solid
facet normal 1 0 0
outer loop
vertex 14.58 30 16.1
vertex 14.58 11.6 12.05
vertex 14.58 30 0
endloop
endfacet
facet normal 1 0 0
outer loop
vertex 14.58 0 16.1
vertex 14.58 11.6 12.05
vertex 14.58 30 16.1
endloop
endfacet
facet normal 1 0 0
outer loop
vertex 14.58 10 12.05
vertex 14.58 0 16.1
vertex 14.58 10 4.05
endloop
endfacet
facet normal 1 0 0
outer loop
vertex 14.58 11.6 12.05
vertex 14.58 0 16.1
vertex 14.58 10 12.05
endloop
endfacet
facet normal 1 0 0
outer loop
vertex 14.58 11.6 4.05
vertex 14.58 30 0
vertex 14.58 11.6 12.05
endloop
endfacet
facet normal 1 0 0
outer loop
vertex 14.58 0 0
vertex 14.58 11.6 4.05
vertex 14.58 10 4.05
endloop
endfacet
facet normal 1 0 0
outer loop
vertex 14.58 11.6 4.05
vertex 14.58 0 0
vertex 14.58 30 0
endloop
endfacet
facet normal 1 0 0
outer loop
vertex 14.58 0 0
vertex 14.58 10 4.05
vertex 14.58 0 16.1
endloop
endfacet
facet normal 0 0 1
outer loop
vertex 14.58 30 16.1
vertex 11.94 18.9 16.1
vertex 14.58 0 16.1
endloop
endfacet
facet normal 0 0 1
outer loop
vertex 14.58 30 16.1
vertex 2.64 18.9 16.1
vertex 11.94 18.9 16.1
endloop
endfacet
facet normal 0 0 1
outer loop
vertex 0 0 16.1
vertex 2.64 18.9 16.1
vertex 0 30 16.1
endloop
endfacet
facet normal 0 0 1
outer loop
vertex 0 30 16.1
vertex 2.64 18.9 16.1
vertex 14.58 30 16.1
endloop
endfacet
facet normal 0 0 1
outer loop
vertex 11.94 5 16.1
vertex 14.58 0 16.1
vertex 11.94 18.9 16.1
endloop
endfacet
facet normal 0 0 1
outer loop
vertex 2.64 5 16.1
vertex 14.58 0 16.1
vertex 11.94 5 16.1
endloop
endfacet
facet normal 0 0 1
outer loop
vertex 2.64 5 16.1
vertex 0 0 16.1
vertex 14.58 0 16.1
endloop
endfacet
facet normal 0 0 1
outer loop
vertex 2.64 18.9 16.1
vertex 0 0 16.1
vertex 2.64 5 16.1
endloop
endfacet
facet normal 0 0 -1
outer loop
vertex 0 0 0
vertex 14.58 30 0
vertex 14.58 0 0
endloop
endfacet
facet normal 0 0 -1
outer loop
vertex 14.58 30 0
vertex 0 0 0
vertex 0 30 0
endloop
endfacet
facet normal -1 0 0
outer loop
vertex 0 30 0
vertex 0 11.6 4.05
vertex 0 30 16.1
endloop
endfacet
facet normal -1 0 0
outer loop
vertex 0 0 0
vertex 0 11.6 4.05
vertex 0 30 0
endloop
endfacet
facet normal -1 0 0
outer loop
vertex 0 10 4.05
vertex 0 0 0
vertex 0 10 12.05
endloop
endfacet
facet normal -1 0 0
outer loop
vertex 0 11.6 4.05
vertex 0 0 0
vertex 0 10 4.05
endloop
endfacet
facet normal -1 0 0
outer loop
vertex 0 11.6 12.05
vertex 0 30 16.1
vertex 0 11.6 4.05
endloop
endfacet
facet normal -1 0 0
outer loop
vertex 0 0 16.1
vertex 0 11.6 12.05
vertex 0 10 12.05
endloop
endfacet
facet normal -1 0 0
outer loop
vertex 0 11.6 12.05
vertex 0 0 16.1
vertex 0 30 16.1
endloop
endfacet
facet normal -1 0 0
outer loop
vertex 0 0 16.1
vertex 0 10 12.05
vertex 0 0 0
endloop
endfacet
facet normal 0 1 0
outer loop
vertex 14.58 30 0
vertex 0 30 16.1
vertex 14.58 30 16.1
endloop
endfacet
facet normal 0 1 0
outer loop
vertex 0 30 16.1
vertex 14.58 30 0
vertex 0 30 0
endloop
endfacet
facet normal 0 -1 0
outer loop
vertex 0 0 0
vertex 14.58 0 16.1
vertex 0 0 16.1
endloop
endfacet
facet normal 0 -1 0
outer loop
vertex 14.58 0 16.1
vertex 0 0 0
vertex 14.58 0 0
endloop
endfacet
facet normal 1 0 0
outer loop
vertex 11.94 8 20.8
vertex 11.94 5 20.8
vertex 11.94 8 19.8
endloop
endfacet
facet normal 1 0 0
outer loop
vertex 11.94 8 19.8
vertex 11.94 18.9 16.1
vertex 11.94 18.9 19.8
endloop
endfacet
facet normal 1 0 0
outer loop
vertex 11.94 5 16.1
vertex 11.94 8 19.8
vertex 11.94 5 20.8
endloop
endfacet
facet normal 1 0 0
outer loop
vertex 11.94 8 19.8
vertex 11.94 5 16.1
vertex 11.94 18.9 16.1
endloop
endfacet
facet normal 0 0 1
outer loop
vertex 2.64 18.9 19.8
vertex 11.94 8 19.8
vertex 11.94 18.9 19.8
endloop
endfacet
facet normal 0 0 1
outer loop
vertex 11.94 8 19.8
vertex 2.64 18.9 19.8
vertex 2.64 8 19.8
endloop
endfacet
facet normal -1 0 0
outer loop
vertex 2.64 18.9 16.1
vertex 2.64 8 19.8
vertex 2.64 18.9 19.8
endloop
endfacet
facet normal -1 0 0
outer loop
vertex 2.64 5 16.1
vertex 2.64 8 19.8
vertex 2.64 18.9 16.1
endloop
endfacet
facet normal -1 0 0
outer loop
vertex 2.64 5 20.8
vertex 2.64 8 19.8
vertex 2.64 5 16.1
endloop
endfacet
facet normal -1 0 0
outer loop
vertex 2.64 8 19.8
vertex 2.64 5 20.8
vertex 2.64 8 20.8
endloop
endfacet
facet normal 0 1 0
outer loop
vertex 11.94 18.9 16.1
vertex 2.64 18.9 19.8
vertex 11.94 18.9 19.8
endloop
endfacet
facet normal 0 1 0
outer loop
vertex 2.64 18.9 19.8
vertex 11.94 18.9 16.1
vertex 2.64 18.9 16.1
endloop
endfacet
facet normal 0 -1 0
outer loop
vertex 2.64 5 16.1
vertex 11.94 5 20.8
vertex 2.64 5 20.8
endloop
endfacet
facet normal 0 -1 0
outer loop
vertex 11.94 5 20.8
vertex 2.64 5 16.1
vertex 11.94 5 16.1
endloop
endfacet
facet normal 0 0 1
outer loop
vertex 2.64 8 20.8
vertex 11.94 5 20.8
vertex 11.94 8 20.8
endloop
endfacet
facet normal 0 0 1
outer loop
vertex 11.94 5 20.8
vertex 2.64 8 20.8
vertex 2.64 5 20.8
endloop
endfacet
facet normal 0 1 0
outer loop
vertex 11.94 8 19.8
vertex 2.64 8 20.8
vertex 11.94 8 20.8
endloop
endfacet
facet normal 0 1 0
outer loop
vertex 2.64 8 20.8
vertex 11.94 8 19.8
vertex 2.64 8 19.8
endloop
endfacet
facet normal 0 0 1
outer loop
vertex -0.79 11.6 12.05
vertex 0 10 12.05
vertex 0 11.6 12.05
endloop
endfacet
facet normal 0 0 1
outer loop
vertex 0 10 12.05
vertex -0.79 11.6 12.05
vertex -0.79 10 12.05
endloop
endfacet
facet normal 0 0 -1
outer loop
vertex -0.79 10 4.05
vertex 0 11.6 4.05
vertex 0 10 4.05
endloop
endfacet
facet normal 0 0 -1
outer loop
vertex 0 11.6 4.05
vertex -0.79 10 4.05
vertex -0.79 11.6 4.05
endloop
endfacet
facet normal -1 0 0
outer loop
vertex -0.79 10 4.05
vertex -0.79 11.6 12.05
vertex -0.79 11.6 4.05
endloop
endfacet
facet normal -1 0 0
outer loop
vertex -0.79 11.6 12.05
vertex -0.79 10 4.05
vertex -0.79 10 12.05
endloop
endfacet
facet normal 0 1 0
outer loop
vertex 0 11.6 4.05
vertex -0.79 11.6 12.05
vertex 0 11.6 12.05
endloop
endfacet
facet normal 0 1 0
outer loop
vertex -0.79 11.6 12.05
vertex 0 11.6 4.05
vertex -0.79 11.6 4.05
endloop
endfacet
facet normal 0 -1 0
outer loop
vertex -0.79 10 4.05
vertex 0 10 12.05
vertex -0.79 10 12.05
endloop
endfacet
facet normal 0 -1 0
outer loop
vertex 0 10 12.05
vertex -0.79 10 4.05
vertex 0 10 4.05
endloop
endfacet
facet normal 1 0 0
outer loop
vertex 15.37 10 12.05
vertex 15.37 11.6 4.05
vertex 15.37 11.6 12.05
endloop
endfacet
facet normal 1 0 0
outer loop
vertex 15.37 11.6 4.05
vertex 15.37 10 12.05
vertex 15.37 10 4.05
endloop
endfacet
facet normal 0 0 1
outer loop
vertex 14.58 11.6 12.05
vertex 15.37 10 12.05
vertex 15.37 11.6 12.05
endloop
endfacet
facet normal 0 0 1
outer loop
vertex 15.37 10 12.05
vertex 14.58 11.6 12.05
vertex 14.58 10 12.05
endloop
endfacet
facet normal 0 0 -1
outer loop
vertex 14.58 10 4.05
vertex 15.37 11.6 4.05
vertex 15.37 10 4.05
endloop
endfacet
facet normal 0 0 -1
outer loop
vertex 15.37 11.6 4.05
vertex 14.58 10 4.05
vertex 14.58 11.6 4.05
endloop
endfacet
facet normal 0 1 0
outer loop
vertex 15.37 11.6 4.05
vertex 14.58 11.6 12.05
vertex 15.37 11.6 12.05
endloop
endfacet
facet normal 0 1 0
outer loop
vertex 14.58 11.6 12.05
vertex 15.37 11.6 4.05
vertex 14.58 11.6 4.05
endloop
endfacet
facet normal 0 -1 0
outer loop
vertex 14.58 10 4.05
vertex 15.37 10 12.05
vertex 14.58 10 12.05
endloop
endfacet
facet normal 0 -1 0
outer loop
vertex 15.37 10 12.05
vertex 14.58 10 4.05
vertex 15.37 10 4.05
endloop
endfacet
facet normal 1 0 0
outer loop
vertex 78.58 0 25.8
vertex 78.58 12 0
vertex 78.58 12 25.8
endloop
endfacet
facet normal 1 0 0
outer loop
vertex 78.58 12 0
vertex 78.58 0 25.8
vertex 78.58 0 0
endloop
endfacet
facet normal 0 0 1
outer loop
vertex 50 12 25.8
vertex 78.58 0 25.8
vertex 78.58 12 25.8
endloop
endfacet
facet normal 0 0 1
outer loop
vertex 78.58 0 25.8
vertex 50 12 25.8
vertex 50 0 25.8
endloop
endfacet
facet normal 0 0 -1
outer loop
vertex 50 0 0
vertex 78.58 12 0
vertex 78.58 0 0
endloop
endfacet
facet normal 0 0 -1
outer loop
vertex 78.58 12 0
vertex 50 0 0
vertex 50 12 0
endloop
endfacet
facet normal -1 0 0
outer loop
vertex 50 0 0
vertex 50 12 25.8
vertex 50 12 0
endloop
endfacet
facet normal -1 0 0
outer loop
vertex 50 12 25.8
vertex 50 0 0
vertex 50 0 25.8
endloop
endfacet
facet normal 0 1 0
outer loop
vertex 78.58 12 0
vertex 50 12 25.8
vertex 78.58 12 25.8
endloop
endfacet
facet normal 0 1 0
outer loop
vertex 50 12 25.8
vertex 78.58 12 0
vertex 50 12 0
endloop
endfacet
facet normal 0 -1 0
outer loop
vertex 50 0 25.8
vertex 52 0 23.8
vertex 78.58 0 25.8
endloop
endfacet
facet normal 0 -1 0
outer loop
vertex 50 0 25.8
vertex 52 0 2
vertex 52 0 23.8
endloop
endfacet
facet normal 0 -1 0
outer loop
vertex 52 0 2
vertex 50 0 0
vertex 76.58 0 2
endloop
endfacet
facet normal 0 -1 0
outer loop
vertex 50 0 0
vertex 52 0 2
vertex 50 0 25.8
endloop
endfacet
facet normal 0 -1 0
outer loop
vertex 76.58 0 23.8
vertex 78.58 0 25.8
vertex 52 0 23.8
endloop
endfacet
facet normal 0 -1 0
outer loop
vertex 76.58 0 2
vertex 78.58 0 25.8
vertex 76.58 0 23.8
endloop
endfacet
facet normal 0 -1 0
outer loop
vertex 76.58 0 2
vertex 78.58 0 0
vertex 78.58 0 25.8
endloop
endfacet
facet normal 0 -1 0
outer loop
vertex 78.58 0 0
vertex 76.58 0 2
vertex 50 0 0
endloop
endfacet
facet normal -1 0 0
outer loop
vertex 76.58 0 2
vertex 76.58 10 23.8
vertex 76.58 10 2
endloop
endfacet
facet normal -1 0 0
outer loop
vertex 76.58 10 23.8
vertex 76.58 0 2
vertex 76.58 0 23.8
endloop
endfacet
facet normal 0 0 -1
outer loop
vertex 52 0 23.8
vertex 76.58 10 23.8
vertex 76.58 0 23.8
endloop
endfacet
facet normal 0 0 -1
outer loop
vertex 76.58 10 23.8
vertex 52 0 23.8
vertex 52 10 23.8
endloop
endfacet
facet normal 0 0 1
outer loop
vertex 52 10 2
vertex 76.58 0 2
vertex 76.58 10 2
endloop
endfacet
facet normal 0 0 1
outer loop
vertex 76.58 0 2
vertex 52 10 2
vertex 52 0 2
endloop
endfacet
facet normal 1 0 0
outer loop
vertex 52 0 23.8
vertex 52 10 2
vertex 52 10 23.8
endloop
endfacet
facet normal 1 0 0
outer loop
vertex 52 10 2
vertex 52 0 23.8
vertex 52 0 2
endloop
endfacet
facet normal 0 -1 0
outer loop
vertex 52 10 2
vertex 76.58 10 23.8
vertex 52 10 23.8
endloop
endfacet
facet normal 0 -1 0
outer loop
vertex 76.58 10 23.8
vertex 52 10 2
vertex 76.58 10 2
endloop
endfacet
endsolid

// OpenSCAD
// file: keystone panel.scad
//keystone for the tray, for routing cables from switch to stuff in the back. Just a cheap amazon keystone.
//
//
//the keystone gets inserted from the rear of the panel, not the front, so the catch clips in, the front stopper should ride
//over the panel front when the catch is squished, then prevent the keystone from being pushed back into the tray.

/*
// next 2 lines used only by my 'on save' script. can be ignored otherwise.
// AUTO-V
version = "v0.1-2026/05/07r18";
*/

ks_width = 14.580;
ks_height = 16.10;
ks_depth = 30.0;
ks_catch_height = 3.7;
ks_catch_width = 9.3;
ks_catch_depth = 13.9;
ks_catch_ypos = 5.0;
ks_catch_edge_depth = 3.0; //the edge part is a tab that sticks up slightly more than the catch
ks_catch_edge_height = 1.0;
ks_side_lip_depth = 1.6;
ks_side_lip_height = 8.0;
ks_side_lip_ypos = 10.0;
ks_side_lip_width = (16.16 - ks_width) / 2;
//there is also a bottom lip, but the catch on top will squish and clip into the case, making the bottom lip a front stopper.
//using this keystone means the front panel is max 2mm thick.

//the panel recess for the keystones, this is because the keystones will otherwise protrude from the front panel.
ks_recess_height = ks_height + ks_catch_height + 2.0; //this is the overall height of the recess in the front panel.
ks_recess_width = ks_width + 10.0; //the overall width of the recess, for multiple this will need adjusting.
ks_recess_depth = ks_side_lip_depth; //how far to recess the keystone into the front panel.
ks_recess_wall_thickness = 2.0; //this is limited by the (ks_catch_ypos+ks_catch_edge_depth)-ks_side_lip_ypos. as the front panel needs to fit between them,

module keystone_panel_recess() {
    difference() {
        cube([ks_recess_width+(ks_recess_wall_thickness * 2), ks_side_lip_ypos+ks_recess_wall_thickness, ks_recess_height+(ks_recess_wall_thickness * 2)]);
        translate([ks_recess_wall_thickness, 0, ks_recess_wall_thickness]) {
            cube([ks_recess_width, ks_side_lip_ypos, ks_recess_height]);
        }
    }
}


module keystone() {
    color("green") {
        cube([ks_width, ks_depth, ks_height]);
    }
    // catch for the keystone to stop it falling out of the tray.
    translate([(ks_width - ks_catch_width)/2, ks_catch_ypos, ks_height]) {
        color("yellow") {
            cube([ks_catch_width, ks_catch_depth, ks_catch_height]);
        }
    }

    //catch edge 
    translate([(ks_width - ks_catch_width)/2, ks_catch_ypos , ks_height + ks_catch_height]) {
        color("yellow") {
            cube([ks_catch_width, ks_catch_edge_depth, ks_catch_edge_height]);
        }
    }


    // side lips for the keystone to help secure it in the tray. left side
    translate([-(ks_side_lip_width), ks_side_lip_ypos, (ks_height / 2)-(ks_side_lip_height/2)]) {
        color("orange") {
            cube([ks_side_lip_width, ks_side_lip_depth, ks_side_lip_height]);
        }
    }
    //right side
    translate([ks_width, ks_side_lip_ypos, (ks_height / 2)-(ks_side_lip_height/2)]) {
        color("orange") {
            cube([ks_side_lip_width, ks_side_lip_depth, ks_side_lip_height]);
        }
    }

}

render() {
    keystone();
    translate([50, 0, 0]) {
        keystone_panel_recess();
    }
}
// main file
//
//
// U-Green UM106X 5 port 2.5gbe switch Tray.
//
//
//************************************************************************
// go to the end of the file to see the tray assembly with switch model **
// comment out the model line for just the tray.                        **
//************************************************************************
//
//



/*
// next 2 lines used only by my 'on save' script. can be ignored otherwise.
// AUTO-V
version = "v0.1-2026/05/15r02";
*/

include <blank variable tray.scad>;
include <keystone panel.scad>;

ug_tray_support_oversize = 1.0; // this is how much larger the switch support is than the switch itself.

ug_tray_fit_wall_thickness = 3.0;
ug_tray_thickness = 4.0;
ug_tray_back_panel_height = 0.3; //in U

ug_width = 160.0;
ug_height = 27.78;
ug_depth = 105.4;

ug_ports_stickout = 0.2; //for visualisation

ug_ports_4x_xpos = 38.0;
ug_ports_4x_zpos = 7.0;
ug_ports_4x_width = 64.0;
ug_ports_4x_height = 13.5;

ug_port_1x_xpos = 106.0;
ug_port_1x_width = 17.0;

ug_port_sfp_xpos = 134.0;
ug_port_sfp_width = 15.0;
ug_port_sfp_height = 10.0;

ug_power_port_stickout = 30;
ug_power_port_xpos = 27.0;
ug_power_port_zpos = 7.5;
ug_power_port_width = 9.0;
ug_power_port_height = ug_height - ug_power_port_zpos; //this has been done to create a larger cutout

ug_tray_fit_width = ug_width + (2* ug_tray_fit_wall_thickness)+ ug_tray_support_oversize;
ug_tray_fit_depth = ug_depth + ug_tray_support_oversize;
ug_tray_fit_height = ug_height / 3;
ug_tray_fit_height_rear = ug_height / 2.5;

//the front panel cutout for the switch. 4mm = 2mm all round. this is so the switch cannot pull out the front of the tray.
ug_tray_cutout_width = ug_width - 4.0;
ug_tray_cutout_height = ug_height - 4.0;
ug_tray_cutout_lip = 2.0; //this is based on 4.0mm above.
ug_tray_front_panel_thickness = 3.0;

ug_tray_keystone_panel_x = 200;
ug_tray_keystone_panel_z = 6;




module ug_um106x() {
    color("gray") {
    cube([ug_width, ug_depth, ug_height]);
    }
    // ports
    translate([ug_ports_4x_xpos, -ug_ports_stickout, ug_ports_4x_zpos]) {
        color("blue") {
        cube([ug_ports_4x_width, ug_ports_stickout, ug_ports_4x_height]);
        }
    }
    translate([ug_port_1x_xpos, -ug_ports_stickout, ug_ports_4x_zpos]) {
        color("blue") {
        cube([ug_port_1x_width, ug_ports_stickout, ug_ports_4x_height]);
        }
    }
    translate([ug_port_sfp_xpos, -ug_ports_stickout, ug_ports_4x_zpos]) {
        color("blue") {
        cube([ug_port_sfp_width, ug_ports_stickout, ug_port_sfp_height]);
        }
    }
    // power port
    translate([ug_power_port_xpos, ug_depth, ug_power_port_zpos]) {
        color("red") {
            cube([ug_power_port_width, ug_power_port_stickout, ug_power_port_height]);
        }
    }
}

module ug_um106x_front_panel() {
    // this creates the switch, then uses ug_tray_cutout_width/height to subtract from the outer dimensions of the switch,
    // with a Y depth of ug_tray_front_panel_thickness. effectively creating the switch, then removing a rectangular ring around the edges.

    //create cube for the front panel, then subtract the cutout for the switch.
//     difference() {
//        cube([ug_width, ug_tray_front_panel_thickness+0.2, ug_height]);
//        translate([ug_tray_cutout_lip, 0, ug_tray_cutout_lip]) {
            cube([ug_tray_cutout_width, ug_tray_front_panel_thickness+0.2, ug_tray_cutout_height]);
//        }
//    }
}

module ug_um106x_tray_internal_support() {
    // U-shaped internal support: left side wall, right side wall, and rear wall only.
    // Open at the front to allow the switch to slide in from the front panel.
    // Prevents the switch from moving sideways or being pushed to the rear of the tray.

    union() {
        // left side wall
        cube([ug_tray_fit_wall_thickness, ug_tray_fit_depth+ug_tray_fit_wall_thickness, ug_tray_fit_height]);
        // right side wall
        translate([ug_tray_fit_width - ug_tray_fit_wall_thickness, 0, 0]) {
            cube([ug_tray_fit_wall_thickness, ug_tray_fit_depth+ug_tray_fit_wall_thickness, ug_tray_fit_height]);
        }
        // rear wall
        translate([0, ug_tray_fit_depth, 0]) {
            cube([ug_tray_fit_width, ug_tray_fit_wall_thickness, ug_tray_fit_height_rear]);
        }
    }
}


module tray_assembly() {
    union() {
        blank_variable_tray(
            panel_u_size = 1,
            tray_u_size = 0.6,
            rack_width = rack_width,
            tray_depth_scale = 0.5,
            holes = 4,
            back_panel = 1,
            back_panel_height = 0.2, //U height
            //side_support_back = 100,
            tray_thickness = ug_tray_thickness,
            front_panel_thickness = ug_tray_front_panel_thickness,
            side_support = 1
        );
        translate([28, ug_tray_front_panel_thickness, ug_tray_thickness]) { //pushed out to view the structure, when complete it will be pushed back to position.
            ug_um106x_tray_internal_support();
        }
    } //union

}

module ug_um106x_tray(showmodel = true, rack_width = 330) {
    render() {
        difference() { //1
            union() {
                difference() { //2
                    tray_assembly();
                    translate([32+ug_tray_cutout_lip, -0.1, ug_tray_thickness+ug_tray_cutout_lip]) { //pushed out to view the structure, when complete it will be pushed back to position.
                        ug_um106x_front_panel();
                    }
                    // the next bit is for subtracting the switch power port from the tray.
                    translate([32, ug_tray_front_panel_thickness, ug_tray_thickness]) {
                        ug_um106x();
                    }
                    //remove the area for the keystone panel
                    translate([ug_tray_keystone_panel_x, -0.1, ug_tray_keystone_panel_z]) {
                        cube([ks_panel_cutout_width, ug_tray_front_panel_thickness+0.2, ks_panel_cutout_height]);
                    }
                } //difference 2
                
                //make a new panel, as it needs to be 2mm thick
                translate([ug_tray_keystone_panel_x, 0, ug_tray_keystone_panel_z]) {
                    cube([ks_panel_cutout_width, 2.0, ks_panel_cutout_height]);
                }

                //*************************************************************************
                //** these next 3 lines are for visualisation of the switch in the tray. **
                //*************************************************************************
                translate([32, ug_tray_front_panel_thickness, ug_tray_thickness]) { 
                    // *** COMMENT OUT THE NEXT LINE TO VIEW THE TRAY WITHOUT THE SWITCH MODEL. ALSO FOR PRINTING ***
                    if (showmodel) {
                        ug_um106x();
                    }
                }
            } //union

            translate([ug_tray_keystone_panel_x+7, ug_tray_front_panel_thickness-3.0, ug_tray_keystone_panel_z+1]) {
                keystone_panel();
            }
        } //difference 1
        if (showmodel) {
            translate([ug_tray_keystone_panel_x+7, ug_tray_front_panel_thickness-3.0, ug_tray_keystone_panel_z+1]) {
                keystone_panel();
            }

        }

    }
}
